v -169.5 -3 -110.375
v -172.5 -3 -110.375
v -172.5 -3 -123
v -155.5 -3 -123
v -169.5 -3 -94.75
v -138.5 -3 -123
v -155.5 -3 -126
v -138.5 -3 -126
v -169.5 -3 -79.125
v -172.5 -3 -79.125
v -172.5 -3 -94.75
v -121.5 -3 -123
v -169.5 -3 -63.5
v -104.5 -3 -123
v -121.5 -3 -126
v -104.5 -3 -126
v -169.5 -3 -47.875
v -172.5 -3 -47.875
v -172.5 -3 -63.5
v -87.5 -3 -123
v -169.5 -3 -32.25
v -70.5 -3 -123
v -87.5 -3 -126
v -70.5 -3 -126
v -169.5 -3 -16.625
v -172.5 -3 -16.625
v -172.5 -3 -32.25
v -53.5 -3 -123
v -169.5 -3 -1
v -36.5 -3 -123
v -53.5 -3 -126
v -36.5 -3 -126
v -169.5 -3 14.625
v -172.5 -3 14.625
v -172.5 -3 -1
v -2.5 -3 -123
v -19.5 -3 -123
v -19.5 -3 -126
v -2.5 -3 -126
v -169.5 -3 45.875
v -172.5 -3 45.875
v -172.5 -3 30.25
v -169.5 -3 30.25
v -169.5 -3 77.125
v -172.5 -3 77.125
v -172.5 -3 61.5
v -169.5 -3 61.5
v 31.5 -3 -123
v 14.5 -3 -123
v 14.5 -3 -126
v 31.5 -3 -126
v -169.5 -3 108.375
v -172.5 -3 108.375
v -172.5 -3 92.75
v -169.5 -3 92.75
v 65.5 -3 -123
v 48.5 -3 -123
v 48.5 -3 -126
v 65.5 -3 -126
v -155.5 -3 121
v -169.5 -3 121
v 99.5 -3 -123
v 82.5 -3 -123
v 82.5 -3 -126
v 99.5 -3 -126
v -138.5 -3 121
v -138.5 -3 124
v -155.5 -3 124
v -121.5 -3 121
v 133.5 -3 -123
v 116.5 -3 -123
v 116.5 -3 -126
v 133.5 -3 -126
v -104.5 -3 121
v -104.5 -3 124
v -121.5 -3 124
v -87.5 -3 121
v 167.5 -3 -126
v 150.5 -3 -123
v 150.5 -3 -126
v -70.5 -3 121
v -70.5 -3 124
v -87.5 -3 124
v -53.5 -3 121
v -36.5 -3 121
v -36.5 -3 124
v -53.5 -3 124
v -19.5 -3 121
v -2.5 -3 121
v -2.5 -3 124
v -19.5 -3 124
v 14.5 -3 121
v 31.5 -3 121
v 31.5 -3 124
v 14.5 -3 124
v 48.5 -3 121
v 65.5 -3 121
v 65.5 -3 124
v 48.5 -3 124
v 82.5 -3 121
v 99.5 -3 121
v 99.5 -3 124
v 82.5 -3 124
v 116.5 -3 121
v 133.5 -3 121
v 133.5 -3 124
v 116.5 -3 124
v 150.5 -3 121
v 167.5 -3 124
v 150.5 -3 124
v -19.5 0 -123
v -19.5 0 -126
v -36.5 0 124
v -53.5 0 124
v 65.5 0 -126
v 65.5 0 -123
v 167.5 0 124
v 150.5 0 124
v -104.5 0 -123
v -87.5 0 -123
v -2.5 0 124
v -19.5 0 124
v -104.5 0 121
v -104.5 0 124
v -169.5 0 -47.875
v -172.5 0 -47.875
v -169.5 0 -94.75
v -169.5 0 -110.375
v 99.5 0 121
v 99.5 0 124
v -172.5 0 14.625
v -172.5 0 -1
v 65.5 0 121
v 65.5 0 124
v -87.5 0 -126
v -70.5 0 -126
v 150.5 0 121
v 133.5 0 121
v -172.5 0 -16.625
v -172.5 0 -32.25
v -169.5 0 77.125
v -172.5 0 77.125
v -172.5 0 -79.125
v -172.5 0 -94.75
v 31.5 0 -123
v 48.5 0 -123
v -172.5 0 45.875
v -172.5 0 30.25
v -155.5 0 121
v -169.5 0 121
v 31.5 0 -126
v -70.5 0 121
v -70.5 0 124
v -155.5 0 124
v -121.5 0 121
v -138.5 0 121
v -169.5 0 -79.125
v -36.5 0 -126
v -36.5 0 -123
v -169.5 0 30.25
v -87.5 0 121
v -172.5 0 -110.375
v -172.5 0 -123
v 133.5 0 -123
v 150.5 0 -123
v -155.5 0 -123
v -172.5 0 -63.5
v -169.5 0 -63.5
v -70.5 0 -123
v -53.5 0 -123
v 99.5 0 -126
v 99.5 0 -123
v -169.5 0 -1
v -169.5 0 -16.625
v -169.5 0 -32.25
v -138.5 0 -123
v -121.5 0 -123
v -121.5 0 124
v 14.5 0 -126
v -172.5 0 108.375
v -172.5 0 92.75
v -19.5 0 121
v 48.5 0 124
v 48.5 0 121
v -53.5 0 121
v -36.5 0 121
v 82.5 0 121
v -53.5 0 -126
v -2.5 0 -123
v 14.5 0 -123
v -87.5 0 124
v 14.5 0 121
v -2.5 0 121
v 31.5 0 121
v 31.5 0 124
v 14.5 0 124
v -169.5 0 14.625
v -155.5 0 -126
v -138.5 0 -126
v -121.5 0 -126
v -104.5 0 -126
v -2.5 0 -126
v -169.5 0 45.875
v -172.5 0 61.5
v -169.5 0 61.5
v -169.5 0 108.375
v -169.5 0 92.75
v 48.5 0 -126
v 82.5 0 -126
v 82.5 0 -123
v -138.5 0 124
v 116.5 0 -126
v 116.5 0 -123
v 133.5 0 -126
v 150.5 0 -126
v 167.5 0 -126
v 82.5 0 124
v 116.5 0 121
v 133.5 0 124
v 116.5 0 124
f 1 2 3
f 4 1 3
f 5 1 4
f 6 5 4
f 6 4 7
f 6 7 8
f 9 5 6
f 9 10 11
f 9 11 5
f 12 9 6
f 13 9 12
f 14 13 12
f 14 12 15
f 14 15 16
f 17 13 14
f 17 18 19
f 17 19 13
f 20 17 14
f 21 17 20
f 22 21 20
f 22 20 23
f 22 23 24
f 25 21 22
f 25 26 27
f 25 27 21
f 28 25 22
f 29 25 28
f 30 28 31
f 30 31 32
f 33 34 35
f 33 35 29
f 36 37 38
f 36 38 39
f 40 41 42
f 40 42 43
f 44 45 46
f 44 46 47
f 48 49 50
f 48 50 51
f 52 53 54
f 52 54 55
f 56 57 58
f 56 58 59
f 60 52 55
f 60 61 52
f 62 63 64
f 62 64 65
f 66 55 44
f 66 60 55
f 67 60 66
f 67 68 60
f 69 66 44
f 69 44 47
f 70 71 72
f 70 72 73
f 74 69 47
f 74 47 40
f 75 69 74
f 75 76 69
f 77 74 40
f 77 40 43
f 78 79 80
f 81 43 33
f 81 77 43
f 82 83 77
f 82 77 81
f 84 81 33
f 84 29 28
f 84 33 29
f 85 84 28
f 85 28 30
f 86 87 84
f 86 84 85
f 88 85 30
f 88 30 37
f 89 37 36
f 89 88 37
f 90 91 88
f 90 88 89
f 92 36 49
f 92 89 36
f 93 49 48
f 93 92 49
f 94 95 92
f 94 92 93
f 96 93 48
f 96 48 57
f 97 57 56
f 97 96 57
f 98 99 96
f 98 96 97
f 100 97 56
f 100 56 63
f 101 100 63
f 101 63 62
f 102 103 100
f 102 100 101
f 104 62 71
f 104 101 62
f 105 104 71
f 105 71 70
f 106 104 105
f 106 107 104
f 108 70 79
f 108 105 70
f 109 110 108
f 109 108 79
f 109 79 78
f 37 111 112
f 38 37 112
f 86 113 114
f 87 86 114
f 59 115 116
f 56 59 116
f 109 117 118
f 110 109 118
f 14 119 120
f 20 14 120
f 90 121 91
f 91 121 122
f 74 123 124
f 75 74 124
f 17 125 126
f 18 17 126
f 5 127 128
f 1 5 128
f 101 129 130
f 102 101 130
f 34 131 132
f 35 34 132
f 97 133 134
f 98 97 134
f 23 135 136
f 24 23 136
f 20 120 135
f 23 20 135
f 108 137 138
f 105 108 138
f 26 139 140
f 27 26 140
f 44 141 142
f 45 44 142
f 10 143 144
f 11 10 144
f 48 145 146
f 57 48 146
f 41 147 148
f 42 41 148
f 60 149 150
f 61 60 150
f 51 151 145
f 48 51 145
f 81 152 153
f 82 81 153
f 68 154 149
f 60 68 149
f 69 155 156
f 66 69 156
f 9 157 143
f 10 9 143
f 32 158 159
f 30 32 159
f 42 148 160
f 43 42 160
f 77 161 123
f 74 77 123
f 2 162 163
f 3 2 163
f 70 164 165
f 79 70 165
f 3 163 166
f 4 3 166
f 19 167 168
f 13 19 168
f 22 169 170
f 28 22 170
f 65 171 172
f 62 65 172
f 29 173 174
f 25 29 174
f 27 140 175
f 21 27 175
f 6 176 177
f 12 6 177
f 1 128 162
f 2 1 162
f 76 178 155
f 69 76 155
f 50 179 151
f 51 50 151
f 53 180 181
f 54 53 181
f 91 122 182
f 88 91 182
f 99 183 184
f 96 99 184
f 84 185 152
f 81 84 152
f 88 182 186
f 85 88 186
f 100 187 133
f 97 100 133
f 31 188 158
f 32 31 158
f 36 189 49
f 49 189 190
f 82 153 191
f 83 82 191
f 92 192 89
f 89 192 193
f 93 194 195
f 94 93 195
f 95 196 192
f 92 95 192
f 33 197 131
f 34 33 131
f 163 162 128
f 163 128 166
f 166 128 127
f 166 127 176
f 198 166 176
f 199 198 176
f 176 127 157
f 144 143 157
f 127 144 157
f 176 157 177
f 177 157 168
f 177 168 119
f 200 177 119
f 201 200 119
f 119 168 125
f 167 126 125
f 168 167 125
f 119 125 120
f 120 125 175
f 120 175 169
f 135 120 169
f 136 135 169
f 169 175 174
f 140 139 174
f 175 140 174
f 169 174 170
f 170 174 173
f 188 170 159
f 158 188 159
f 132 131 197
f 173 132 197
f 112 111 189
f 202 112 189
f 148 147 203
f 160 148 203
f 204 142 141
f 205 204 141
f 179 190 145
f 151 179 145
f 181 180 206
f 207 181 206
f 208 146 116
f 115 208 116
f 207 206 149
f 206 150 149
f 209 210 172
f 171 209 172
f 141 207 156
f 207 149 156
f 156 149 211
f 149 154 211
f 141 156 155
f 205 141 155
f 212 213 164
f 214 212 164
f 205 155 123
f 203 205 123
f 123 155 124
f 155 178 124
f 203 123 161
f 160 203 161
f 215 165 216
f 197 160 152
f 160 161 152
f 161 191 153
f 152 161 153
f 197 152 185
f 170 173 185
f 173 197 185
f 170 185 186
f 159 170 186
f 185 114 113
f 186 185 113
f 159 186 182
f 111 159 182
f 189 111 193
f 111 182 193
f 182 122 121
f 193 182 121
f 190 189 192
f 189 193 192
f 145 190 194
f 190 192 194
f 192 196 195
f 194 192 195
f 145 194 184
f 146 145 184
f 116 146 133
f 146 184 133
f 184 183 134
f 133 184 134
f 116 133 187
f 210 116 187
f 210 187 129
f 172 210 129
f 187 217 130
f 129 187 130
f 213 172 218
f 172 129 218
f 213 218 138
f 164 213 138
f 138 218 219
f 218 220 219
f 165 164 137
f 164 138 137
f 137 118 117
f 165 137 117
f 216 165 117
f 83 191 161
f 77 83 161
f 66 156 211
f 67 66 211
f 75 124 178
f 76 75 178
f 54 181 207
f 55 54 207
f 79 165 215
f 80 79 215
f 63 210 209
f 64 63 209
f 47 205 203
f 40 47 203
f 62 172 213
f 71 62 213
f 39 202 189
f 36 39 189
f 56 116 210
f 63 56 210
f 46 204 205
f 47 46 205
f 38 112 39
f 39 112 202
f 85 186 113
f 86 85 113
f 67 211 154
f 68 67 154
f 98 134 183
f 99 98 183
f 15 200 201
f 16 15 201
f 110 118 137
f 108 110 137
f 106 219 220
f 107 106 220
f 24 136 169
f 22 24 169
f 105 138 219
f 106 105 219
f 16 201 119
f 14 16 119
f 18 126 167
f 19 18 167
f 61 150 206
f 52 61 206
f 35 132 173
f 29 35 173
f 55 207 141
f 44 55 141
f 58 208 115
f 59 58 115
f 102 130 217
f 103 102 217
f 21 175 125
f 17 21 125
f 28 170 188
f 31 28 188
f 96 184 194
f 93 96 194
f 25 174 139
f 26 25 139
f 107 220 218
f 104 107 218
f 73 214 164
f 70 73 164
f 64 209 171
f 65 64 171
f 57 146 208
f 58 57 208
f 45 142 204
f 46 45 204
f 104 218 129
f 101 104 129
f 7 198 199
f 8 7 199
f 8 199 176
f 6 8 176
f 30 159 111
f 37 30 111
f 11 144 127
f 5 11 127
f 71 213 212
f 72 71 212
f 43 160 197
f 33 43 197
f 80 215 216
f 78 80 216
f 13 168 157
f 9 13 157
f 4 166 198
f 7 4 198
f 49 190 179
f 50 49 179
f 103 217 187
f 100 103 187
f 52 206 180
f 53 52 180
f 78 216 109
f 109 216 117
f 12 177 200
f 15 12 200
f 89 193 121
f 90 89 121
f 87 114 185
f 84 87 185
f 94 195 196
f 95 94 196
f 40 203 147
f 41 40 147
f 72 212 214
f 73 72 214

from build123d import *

# Parameters (mm, degrees)
F1_DEPTH = 3


with BuildPart() as f1:
    # F0 (on Front) → F1 (new body)
    with BuildSketch(Plane.XZ):
        Polygon((167.500045, -126.000002), (167.500045, 123.999998), (150.500045, 123.999998), (150.500045, 120.999998), (133.500045, 120.999998), (133.500045, 123.999998), (116.500045, 123.999998), (116.500045, 120.999998), (99.500045, 120.999998), (99.500045, 123.999998), (82.500045, 123.999998), (82.500045, 120.999998), (65.500045, 120.999998), (65.500045, 123.999998), (48.500045, 123.999998), (48.500045, 120.999998), (31.500045, 120.999998), (31.500045, 123.999998), (14.500045, 123.999998), (14.500045, 120.999998), (-2.499955, 120.999998), (-2.499955, 123.999998), (-19.499955, 123.999998), (-19.499955, 120.999998), (-36.499955, 120.999998), (-36.499955, 123.999998), (-53.499955, 123.999998), (-53.499955, 120.999998), (-70.499955, 120.999998), (-70.499955, 123.999998), (-87.499955, 123.999998), (-87.499955, 120.999998), (-104.499955, 120.999998), (-104.499955, 123.999998), (-121.499955, 123.999998), (-121.499955, 120.999998), (-138.499955, 120.999998), (-138.499955, 123.999998), (-155.499955, 123.999998), (-155.499955, 120.999998), (-169.499955, 120.999998), (-169.499955, 108.374998), (-172.499955, 108.374998), (-172.499955, 92.749998), (-169.499955, 92.749998), (-169.499955, 77.124998), (-172.499955, 77.124998), (-172.499955, 61.499998), (-169.499955, 61.499998), (-169.499955, 45.874998), (-172.499955, 45.874998), (-172.499955, 30.249998), (-169.499955, 30.249998), (-169.499955, 14.624998), (-172.499955, 14.624998), (-172.499955, -1.000002), (-169.499955, -1.000002), (-169.499955, -16.625002), (-172.499955, -16.625002), (-172.499955, -32.250002), (-169.499955, -32.250002), (-169.499955, -47.875002), (-172.499955, -47.875002), (-172.499955, -63.500002), (-169.499955, -63.500002), (-169.499955, -79.125002), (-172.499955, -79.125002), (-172.499955, -94.750002), (-169.499955, -94.750002), (-169.499955, -110.375002), (-172.499955, -110.375002), (-172.499955, -123.000002), (-155.499955, -123.000002), (-155.499955, -126.000002), (-138.499955, -126.000002), (-138.499955, -123.000002), (-121.499955, -123.000002), (-121.499955, -126.000002), (-104.499955, -126.000002), (-104.499955, -123.000002), (-87.499955, -123.000002), (-87.499955, -126.000002), (-70.499955, -126.000002), (-70.499955, -123.000002), (-53.499955, -123.000002), (-53.499955, -126.000002), (-36.499955, -126.000002), (-36.499955, -123.000002), (-19.499955, -123.000002), (-19.499955, -126.000002), (-2.499955, -126.000002), (-2.499955, -123.000002), (14.500045, -123.000002), (14.500045, -126.000002), (31.500045, -126.000002), (31.500045, -123.000002), (48.500045, -123.000002), (48.500045, -126.000002), (65.500045, -126.000002), (65.500045, -123.000002), (82.500045, -123.000002), (82.500045, -126.000002), (99.500045, -126.000002), (99.500045, -123.000002), (116.500045, -123.000002), (116.500045, -126.000002), (133.500045, -126.000002), (133.500045, -123.000002), (150.500045, -123.000002), (150.500045, -126.000002), align=None)
    extrude(amount=F1_DEPTH)


solid = f1.part
